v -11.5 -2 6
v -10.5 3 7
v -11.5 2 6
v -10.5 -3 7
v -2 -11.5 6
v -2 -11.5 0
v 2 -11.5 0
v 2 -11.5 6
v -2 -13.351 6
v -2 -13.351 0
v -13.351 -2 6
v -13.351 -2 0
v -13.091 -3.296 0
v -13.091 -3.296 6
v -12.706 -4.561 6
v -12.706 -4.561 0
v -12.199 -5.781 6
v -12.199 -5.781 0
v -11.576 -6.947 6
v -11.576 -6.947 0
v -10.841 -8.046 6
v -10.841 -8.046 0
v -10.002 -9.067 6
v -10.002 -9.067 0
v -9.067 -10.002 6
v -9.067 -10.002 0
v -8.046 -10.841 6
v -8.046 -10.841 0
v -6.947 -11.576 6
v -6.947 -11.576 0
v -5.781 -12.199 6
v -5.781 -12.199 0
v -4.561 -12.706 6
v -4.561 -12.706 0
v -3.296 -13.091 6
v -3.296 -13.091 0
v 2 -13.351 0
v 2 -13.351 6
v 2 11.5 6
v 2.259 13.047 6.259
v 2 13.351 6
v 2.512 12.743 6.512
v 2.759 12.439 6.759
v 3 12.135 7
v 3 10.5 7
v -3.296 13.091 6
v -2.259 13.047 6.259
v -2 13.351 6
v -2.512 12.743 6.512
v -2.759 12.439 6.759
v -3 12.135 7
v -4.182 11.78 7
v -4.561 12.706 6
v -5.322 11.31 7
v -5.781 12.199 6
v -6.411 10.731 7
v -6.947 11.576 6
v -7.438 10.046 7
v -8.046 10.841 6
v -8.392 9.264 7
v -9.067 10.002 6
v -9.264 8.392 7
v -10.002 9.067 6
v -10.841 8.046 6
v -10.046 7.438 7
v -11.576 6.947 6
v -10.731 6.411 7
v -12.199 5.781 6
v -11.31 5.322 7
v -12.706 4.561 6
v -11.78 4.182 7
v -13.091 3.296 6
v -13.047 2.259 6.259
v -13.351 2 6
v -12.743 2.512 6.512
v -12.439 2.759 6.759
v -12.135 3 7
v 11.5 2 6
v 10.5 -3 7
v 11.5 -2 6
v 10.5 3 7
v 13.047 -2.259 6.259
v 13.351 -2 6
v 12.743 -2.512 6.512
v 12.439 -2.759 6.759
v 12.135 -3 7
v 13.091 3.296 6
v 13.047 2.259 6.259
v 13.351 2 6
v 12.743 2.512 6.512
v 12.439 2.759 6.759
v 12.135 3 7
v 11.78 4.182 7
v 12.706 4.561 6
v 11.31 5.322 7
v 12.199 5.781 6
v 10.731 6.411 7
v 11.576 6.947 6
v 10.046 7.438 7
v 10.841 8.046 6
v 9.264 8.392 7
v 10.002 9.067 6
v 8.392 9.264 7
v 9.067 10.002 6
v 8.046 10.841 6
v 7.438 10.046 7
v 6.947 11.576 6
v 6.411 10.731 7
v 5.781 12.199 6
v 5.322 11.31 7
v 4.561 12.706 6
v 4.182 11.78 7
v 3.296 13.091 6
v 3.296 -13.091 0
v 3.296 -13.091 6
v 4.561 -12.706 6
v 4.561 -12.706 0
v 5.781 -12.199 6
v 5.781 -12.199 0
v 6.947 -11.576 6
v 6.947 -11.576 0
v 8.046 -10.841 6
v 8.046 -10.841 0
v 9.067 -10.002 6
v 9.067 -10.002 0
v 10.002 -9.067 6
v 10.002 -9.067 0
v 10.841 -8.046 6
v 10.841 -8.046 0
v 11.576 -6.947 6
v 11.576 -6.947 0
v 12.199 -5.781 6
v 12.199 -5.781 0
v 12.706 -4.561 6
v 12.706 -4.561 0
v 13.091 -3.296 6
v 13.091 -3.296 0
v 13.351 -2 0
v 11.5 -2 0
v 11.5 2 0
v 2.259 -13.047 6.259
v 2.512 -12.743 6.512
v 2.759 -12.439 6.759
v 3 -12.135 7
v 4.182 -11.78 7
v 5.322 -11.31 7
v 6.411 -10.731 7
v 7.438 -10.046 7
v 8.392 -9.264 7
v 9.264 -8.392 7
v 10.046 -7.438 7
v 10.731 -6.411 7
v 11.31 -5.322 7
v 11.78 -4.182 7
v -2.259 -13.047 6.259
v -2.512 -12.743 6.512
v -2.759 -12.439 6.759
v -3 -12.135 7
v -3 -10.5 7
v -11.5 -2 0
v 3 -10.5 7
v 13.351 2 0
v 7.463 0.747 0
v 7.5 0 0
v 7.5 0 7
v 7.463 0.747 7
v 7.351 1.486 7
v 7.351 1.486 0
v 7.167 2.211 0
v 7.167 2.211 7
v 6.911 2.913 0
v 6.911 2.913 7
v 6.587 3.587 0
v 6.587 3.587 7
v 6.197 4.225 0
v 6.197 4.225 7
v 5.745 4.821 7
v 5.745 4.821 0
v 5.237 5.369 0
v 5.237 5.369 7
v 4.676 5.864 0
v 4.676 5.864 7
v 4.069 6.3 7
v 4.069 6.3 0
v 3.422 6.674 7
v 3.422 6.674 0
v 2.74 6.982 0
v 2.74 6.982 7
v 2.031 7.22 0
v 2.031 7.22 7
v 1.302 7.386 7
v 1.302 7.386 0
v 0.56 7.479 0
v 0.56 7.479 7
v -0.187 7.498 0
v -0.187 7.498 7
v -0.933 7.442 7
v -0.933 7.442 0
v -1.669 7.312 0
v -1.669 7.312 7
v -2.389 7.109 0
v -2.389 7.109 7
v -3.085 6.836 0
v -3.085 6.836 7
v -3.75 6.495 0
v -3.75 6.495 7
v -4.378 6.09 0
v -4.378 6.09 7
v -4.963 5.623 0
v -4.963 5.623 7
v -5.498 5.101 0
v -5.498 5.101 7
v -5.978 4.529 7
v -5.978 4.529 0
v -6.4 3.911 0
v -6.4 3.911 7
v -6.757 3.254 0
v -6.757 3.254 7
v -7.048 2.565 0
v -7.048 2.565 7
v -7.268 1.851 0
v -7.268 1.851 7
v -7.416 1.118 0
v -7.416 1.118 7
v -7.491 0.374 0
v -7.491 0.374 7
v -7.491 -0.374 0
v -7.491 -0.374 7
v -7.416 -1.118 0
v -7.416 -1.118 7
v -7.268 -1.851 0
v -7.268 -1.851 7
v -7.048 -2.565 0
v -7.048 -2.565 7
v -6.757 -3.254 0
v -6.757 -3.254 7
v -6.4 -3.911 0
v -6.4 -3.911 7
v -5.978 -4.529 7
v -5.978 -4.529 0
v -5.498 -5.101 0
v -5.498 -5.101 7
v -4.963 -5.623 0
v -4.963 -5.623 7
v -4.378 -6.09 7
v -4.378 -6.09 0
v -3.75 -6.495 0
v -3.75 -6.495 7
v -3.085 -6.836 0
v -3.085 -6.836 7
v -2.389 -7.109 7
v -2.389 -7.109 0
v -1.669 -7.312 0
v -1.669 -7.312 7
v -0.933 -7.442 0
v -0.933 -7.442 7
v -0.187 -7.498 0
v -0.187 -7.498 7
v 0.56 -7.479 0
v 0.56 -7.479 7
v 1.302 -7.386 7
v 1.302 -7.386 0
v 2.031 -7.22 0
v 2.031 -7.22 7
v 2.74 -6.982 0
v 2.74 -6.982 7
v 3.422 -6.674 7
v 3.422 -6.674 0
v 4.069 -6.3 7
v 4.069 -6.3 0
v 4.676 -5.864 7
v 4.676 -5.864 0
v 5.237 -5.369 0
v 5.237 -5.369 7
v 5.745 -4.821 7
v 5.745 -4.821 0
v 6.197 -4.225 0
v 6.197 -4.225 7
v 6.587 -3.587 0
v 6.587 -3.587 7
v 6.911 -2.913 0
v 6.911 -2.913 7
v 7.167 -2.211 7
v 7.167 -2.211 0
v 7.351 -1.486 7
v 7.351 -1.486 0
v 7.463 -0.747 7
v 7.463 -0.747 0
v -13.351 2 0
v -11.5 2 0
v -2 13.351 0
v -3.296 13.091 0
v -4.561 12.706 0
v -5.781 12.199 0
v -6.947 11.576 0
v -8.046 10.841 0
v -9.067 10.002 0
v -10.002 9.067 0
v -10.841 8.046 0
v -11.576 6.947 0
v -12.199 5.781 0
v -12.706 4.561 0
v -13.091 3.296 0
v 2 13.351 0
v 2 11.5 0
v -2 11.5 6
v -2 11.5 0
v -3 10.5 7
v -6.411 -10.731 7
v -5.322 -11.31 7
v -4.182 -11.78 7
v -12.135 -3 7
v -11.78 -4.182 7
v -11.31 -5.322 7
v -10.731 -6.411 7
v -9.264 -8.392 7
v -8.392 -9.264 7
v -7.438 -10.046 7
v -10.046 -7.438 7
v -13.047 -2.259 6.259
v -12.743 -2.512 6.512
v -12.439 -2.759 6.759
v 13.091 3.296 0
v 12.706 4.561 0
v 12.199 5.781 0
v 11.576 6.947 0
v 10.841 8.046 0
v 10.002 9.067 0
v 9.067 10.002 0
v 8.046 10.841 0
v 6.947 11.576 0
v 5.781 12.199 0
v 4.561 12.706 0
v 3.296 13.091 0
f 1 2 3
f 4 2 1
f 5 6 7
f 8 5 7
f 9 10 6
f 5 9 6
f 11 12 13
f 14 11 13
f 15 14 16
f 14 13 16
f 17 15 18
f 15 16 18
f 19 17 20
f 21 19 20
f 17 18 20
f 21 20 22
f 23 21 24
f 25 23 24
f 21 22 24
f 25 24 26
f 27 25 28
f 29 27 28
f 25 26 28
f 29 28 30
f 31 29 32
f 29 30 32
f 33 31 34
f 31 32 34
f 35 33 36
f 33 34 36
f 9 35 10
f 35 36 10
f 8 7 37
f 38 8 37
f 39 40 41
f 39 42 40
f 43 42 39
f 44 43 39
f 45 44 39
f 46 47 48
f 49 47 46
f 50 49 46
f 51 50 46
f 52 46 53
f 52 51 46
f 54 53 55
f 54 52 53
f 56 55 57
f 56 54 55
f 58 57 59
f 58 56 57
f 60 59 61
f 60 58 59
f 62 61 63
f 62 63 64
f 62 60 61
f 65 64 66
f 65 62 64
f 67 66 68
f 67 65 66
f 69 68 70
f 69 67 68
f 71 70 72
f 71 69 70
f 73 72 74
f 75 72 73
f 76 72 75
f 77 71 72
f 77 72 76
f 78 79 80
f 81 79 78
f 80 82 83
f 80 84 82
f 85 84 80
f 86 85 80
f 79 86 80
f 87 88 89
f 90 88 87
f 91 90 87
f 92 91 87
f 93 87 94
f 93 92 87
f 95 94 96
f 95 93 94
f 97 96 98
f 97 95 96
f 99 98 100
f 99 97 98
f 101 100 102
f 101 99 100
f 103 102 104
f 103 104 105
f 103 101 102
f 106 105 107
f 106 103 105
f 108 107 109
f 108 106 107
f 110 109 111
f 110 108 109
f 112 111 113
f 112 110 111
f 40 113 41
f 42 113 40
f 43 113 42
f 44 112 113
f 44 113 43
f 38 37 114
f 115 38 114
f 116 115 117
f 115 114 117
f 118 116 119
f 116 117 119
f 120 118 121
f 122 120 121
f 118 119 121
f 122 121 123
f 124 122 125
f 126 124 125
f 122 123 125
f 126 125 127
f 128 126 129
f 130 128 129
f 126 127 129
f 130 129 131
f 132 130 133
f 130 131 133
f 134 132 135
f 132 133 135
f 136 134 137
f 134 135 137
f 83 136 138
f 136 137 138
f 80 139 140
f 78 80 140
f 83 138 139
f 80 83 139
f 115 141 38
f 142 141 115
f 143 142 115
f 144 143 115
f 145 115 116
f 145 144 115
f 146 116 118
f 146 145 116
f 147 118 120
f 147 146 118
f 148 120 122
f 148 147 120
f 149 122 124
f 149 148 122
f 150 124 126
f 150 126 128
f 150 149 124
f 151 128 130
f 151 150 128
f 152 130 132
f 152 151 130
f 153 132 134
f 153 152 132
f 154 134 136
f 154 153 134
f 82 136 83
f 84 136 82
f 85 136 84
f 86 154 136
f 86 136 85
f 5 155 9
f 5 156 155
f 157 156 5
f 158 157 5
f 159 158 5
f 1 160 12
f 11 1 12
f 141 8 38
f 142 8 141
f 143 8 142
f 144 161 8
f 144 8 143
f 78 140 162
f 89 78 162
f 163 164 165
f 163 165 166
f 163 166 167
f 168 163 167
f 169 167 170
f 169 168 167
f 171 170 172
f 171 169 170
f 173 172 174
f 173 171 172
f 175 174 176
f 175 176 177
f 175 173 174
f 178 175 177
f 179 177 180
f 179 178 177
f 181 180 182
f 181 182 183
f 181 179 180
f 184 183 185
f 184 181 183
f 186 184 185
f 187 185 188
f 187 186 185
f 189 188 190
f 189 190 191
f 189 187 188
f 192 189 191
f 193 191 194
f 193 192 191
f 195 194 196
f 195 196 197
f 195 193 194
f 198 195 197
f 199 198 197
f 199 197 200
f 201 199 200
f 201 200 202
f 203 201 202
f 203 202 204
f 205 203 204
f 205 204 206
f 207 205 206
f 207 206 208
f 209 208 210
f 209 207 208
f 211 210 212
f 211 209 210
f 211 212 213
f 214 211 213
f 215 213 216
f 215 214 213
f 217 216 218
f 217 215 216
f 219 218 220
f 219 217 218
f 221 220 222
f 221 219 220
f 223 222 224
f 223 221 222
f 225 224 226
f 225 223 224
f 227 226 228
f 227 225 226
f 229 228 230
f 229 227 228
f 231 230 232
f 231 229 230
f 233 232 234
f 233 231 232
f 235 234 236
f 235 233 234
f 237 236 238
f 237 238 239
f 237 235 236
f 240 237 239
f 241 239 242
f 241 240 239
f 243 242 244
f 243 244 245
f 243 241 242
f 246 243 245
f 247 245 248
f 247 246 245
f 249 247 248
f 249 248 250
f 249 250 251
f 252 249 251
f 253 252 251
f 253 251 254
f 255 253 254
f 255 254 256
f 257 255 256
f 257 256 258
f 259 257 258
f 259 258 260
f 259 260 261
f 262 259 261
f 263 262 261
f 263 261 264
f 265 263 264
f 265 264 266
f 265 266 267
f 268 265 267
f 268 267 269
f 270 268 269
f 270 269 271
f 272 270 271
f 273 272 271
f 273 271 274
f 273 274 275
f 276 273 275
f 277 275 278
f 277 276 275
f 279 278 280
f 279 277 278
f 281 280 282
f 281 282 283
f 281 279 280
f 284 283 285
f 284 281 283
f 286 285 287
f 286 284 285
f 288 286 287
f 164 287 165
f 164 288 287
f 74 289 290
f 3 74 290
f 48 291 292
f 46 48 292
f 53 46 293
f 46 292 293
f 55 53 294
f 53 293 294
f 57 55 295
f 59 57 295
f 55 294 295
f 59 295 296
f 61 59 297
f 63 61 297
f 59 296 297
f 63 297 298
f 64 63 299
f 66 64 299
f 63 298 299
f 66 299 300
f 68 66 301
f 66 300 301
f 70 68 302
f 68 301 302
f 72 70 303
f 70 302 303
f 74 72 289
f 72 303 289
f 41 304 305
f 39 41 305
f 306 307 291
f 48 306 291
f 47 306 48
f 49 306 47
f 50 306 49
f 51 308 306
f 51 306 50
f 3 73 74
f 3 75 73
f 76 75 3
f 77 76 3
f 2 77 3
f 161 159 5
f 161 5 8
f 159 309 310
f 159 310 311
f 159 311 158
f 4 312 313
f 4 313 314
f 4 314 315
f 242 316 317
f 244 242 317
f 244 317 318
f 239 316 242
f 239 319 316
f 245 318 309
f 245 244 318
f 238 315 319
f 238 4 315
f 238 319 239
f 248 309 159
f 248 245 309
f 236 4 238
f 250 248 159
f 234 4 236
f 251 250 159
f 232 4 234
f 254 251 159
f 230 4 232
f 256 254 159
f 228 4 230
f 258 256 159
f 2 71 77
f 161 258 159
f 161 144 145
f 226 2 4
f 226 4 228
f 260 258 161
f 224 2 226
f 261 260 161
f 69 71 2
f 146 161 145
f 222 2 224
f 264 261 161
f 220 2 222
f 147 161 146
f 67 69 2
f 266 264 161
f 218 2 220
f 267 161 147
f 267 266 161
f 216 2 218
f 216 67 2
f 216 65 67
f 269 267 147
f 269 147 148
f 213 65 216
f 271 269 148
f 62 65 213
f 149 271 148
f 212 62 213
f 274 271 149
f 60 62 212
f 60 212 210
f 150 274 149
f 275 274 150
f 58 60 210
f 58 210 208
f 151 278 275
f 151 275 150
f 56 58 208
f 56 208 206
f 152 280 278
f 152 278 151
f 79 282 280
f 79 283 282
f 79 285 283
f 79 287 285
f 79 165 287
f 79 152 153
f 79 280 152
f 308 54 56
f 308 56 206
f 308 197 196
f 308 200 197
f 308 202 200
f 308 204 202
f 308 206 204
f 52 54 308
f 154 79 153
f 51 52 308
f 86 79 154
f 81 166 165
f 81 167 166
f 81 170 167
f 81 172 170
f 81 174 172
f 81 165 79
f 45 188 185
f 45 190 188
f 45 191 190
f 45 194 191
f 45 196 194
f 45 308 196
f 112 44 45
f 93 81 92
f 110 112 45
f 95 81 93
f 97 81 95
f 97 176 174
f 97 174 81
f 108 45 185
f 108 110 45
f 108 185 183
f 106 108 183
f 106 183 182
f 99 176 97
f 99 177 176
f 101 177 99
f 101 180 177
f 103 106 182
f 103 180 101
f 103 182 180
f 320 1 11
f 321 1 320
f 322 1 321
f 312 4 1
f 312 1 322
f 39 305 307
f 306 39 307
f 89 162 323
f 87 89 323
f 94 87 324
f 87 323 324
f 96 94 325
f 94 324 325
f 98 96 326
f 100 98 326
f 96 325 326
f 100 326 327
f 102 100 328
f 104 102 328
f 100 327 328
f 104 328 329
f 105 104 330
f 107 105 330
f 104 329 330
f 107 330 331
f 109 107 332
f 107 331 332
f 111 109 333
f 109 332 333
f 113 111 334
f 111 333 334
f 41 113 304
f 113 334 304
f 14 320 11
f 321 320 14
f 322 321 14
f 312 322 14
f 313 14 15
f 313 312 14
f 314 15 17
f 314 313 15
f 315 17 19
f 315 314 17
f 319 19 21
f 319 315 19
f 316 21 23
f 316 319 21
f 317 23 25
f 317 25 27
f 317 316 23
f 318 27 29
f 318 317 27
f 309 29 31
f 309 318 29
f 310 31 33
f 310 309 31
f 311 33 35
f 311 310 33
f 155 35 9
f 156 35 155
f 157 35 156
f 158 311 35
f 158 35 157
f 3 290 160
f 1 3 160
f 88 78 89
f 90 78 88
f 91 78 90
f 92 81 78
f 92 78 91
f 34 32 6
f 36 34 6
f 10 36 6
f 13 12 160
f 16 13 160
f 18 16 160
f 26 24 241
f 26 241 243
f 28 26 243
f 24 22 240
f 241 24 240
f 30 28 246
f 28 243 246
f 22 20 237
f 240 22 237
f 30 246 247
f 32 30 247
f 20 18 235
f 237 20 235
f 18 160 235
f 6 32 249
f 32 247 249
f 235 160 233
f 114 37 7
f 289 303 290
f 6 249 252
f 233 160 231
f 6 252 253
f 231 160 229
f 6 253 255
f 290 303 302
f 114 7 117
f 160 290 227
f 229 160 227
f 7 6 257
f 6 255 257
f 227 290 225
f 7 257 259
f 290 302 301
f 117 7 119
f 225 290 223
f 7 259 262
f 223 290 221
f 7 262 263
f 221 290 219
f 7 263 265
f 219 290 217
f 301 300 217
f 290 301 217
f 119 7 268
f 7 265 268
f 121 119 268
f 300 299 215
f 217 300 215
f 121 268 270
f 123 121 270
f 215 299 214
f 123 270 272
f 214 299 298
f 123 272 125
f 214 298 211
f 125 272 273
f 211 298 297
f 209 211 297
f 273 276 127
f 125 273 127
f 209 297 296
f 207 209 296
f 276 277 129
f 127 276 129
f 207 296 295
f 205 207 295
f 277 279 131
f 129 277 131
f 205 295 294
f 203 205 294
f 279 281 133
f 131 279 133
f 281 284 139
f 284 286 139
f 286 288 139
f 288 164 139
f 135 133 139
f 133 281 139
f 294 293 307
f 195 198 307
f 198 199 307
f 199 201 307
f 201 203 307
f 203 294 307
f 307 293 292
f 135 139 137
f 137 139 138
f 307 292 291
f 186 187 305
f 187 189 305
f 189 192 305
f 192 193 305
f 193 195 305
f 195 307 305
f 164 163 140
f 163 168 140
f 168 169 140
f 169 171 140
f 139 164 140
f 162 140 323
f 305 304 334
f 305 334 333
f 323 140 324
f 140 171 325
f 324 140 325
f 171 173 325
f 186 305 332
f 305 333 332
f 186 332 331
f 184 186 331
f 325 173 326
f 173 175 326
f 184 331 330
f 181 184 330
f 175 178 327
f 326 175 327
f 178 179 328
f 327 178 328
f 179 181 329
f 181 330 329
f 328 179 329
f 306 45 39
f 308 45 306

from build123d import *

# Parameters (mm, degrees)
SKETCH1_R           = 7.5
BOSS_EXTRUDE1_DEPTH = 7
CHAMFER1_SIZE       = 1


with BuildPart() as part:
    # Sketch1 → Boss-Extrude1 (new body)
    with BuildSketch(Plane.XY):
        with BuildLine():
            Line((11.5, -2), (11.5, 2))
            Line((11.5, 2), (13.351029923, 2))
            ThreePointArc((13.351029923, 2), (9.545941546, 9.545941546), (2, 13.351029923))
            Line((2, 13.351029923), (2, 11.5))
            Line((2, 11.5), (-2, 11.5))
            Line((-2, 11.5), (-2, 13.351029923))
            ThreePointArc((-2, 13.351029923), (-9.545941546, 9.545941546), (-13.351029923, 2))
            Line((-13.351029923, 2), (-11.5, 2))
            Line((-11.5, 2), (-11.5, -2))
            Line((-11.5, -2), (-13.351029923, -2))
            ThreePointArc((-13.351029923, -2), (-9.545941546, -9.545941546), (-2, -13.351029923))
            Line((-2, -13.351029923), (-2, -11.5))
            Line((-2, -11.5), (2, -11.5))
            Line((2, -11.5), (2, -13.351029923))
            ThreePointArc((2, -13.351029923), (9.545941546, -9.545941546), (13.351029923, -2))
            Line((13.351029923, -2), (11.5, -2))
        make_face()
        Circle(SKETCH1_R, mode=Mode.SUBTRACT)
    extrude(amount=BOSS_EXTRUDE1_DEPTH)

    # Chamfer1
    chamfer1_edges = [part.edges().sort_by_distance(p)[0] for p in [
        (12.425514961, 2, 7),
        (9.545941546, 9.545941546, 7),
        (2, 12.425514961, 7),
        (0, 11.5, 7),
        (-2, 12.425514961, 7),
        (-9.545941546, 9.545941546, 7),
        (-12.425514961, 2, 7),
        (-11.5, 0, 7),
        (-12.425514961, -2, 7),
        (-9.545941546, -9.545941546, 7),
        (-2, -12.425514961, 7),
        (0, -11.5, 7),
        (2, -12.425514961, 7),
        (9.545941546, -9.545941546, 7),
        (12.425514961, -2, 7),
        (11.5, 0, 7),
    ]]
    chamfer(chamfer1_edges, length=CHAMFER1_SIZE)


solid = part.part
